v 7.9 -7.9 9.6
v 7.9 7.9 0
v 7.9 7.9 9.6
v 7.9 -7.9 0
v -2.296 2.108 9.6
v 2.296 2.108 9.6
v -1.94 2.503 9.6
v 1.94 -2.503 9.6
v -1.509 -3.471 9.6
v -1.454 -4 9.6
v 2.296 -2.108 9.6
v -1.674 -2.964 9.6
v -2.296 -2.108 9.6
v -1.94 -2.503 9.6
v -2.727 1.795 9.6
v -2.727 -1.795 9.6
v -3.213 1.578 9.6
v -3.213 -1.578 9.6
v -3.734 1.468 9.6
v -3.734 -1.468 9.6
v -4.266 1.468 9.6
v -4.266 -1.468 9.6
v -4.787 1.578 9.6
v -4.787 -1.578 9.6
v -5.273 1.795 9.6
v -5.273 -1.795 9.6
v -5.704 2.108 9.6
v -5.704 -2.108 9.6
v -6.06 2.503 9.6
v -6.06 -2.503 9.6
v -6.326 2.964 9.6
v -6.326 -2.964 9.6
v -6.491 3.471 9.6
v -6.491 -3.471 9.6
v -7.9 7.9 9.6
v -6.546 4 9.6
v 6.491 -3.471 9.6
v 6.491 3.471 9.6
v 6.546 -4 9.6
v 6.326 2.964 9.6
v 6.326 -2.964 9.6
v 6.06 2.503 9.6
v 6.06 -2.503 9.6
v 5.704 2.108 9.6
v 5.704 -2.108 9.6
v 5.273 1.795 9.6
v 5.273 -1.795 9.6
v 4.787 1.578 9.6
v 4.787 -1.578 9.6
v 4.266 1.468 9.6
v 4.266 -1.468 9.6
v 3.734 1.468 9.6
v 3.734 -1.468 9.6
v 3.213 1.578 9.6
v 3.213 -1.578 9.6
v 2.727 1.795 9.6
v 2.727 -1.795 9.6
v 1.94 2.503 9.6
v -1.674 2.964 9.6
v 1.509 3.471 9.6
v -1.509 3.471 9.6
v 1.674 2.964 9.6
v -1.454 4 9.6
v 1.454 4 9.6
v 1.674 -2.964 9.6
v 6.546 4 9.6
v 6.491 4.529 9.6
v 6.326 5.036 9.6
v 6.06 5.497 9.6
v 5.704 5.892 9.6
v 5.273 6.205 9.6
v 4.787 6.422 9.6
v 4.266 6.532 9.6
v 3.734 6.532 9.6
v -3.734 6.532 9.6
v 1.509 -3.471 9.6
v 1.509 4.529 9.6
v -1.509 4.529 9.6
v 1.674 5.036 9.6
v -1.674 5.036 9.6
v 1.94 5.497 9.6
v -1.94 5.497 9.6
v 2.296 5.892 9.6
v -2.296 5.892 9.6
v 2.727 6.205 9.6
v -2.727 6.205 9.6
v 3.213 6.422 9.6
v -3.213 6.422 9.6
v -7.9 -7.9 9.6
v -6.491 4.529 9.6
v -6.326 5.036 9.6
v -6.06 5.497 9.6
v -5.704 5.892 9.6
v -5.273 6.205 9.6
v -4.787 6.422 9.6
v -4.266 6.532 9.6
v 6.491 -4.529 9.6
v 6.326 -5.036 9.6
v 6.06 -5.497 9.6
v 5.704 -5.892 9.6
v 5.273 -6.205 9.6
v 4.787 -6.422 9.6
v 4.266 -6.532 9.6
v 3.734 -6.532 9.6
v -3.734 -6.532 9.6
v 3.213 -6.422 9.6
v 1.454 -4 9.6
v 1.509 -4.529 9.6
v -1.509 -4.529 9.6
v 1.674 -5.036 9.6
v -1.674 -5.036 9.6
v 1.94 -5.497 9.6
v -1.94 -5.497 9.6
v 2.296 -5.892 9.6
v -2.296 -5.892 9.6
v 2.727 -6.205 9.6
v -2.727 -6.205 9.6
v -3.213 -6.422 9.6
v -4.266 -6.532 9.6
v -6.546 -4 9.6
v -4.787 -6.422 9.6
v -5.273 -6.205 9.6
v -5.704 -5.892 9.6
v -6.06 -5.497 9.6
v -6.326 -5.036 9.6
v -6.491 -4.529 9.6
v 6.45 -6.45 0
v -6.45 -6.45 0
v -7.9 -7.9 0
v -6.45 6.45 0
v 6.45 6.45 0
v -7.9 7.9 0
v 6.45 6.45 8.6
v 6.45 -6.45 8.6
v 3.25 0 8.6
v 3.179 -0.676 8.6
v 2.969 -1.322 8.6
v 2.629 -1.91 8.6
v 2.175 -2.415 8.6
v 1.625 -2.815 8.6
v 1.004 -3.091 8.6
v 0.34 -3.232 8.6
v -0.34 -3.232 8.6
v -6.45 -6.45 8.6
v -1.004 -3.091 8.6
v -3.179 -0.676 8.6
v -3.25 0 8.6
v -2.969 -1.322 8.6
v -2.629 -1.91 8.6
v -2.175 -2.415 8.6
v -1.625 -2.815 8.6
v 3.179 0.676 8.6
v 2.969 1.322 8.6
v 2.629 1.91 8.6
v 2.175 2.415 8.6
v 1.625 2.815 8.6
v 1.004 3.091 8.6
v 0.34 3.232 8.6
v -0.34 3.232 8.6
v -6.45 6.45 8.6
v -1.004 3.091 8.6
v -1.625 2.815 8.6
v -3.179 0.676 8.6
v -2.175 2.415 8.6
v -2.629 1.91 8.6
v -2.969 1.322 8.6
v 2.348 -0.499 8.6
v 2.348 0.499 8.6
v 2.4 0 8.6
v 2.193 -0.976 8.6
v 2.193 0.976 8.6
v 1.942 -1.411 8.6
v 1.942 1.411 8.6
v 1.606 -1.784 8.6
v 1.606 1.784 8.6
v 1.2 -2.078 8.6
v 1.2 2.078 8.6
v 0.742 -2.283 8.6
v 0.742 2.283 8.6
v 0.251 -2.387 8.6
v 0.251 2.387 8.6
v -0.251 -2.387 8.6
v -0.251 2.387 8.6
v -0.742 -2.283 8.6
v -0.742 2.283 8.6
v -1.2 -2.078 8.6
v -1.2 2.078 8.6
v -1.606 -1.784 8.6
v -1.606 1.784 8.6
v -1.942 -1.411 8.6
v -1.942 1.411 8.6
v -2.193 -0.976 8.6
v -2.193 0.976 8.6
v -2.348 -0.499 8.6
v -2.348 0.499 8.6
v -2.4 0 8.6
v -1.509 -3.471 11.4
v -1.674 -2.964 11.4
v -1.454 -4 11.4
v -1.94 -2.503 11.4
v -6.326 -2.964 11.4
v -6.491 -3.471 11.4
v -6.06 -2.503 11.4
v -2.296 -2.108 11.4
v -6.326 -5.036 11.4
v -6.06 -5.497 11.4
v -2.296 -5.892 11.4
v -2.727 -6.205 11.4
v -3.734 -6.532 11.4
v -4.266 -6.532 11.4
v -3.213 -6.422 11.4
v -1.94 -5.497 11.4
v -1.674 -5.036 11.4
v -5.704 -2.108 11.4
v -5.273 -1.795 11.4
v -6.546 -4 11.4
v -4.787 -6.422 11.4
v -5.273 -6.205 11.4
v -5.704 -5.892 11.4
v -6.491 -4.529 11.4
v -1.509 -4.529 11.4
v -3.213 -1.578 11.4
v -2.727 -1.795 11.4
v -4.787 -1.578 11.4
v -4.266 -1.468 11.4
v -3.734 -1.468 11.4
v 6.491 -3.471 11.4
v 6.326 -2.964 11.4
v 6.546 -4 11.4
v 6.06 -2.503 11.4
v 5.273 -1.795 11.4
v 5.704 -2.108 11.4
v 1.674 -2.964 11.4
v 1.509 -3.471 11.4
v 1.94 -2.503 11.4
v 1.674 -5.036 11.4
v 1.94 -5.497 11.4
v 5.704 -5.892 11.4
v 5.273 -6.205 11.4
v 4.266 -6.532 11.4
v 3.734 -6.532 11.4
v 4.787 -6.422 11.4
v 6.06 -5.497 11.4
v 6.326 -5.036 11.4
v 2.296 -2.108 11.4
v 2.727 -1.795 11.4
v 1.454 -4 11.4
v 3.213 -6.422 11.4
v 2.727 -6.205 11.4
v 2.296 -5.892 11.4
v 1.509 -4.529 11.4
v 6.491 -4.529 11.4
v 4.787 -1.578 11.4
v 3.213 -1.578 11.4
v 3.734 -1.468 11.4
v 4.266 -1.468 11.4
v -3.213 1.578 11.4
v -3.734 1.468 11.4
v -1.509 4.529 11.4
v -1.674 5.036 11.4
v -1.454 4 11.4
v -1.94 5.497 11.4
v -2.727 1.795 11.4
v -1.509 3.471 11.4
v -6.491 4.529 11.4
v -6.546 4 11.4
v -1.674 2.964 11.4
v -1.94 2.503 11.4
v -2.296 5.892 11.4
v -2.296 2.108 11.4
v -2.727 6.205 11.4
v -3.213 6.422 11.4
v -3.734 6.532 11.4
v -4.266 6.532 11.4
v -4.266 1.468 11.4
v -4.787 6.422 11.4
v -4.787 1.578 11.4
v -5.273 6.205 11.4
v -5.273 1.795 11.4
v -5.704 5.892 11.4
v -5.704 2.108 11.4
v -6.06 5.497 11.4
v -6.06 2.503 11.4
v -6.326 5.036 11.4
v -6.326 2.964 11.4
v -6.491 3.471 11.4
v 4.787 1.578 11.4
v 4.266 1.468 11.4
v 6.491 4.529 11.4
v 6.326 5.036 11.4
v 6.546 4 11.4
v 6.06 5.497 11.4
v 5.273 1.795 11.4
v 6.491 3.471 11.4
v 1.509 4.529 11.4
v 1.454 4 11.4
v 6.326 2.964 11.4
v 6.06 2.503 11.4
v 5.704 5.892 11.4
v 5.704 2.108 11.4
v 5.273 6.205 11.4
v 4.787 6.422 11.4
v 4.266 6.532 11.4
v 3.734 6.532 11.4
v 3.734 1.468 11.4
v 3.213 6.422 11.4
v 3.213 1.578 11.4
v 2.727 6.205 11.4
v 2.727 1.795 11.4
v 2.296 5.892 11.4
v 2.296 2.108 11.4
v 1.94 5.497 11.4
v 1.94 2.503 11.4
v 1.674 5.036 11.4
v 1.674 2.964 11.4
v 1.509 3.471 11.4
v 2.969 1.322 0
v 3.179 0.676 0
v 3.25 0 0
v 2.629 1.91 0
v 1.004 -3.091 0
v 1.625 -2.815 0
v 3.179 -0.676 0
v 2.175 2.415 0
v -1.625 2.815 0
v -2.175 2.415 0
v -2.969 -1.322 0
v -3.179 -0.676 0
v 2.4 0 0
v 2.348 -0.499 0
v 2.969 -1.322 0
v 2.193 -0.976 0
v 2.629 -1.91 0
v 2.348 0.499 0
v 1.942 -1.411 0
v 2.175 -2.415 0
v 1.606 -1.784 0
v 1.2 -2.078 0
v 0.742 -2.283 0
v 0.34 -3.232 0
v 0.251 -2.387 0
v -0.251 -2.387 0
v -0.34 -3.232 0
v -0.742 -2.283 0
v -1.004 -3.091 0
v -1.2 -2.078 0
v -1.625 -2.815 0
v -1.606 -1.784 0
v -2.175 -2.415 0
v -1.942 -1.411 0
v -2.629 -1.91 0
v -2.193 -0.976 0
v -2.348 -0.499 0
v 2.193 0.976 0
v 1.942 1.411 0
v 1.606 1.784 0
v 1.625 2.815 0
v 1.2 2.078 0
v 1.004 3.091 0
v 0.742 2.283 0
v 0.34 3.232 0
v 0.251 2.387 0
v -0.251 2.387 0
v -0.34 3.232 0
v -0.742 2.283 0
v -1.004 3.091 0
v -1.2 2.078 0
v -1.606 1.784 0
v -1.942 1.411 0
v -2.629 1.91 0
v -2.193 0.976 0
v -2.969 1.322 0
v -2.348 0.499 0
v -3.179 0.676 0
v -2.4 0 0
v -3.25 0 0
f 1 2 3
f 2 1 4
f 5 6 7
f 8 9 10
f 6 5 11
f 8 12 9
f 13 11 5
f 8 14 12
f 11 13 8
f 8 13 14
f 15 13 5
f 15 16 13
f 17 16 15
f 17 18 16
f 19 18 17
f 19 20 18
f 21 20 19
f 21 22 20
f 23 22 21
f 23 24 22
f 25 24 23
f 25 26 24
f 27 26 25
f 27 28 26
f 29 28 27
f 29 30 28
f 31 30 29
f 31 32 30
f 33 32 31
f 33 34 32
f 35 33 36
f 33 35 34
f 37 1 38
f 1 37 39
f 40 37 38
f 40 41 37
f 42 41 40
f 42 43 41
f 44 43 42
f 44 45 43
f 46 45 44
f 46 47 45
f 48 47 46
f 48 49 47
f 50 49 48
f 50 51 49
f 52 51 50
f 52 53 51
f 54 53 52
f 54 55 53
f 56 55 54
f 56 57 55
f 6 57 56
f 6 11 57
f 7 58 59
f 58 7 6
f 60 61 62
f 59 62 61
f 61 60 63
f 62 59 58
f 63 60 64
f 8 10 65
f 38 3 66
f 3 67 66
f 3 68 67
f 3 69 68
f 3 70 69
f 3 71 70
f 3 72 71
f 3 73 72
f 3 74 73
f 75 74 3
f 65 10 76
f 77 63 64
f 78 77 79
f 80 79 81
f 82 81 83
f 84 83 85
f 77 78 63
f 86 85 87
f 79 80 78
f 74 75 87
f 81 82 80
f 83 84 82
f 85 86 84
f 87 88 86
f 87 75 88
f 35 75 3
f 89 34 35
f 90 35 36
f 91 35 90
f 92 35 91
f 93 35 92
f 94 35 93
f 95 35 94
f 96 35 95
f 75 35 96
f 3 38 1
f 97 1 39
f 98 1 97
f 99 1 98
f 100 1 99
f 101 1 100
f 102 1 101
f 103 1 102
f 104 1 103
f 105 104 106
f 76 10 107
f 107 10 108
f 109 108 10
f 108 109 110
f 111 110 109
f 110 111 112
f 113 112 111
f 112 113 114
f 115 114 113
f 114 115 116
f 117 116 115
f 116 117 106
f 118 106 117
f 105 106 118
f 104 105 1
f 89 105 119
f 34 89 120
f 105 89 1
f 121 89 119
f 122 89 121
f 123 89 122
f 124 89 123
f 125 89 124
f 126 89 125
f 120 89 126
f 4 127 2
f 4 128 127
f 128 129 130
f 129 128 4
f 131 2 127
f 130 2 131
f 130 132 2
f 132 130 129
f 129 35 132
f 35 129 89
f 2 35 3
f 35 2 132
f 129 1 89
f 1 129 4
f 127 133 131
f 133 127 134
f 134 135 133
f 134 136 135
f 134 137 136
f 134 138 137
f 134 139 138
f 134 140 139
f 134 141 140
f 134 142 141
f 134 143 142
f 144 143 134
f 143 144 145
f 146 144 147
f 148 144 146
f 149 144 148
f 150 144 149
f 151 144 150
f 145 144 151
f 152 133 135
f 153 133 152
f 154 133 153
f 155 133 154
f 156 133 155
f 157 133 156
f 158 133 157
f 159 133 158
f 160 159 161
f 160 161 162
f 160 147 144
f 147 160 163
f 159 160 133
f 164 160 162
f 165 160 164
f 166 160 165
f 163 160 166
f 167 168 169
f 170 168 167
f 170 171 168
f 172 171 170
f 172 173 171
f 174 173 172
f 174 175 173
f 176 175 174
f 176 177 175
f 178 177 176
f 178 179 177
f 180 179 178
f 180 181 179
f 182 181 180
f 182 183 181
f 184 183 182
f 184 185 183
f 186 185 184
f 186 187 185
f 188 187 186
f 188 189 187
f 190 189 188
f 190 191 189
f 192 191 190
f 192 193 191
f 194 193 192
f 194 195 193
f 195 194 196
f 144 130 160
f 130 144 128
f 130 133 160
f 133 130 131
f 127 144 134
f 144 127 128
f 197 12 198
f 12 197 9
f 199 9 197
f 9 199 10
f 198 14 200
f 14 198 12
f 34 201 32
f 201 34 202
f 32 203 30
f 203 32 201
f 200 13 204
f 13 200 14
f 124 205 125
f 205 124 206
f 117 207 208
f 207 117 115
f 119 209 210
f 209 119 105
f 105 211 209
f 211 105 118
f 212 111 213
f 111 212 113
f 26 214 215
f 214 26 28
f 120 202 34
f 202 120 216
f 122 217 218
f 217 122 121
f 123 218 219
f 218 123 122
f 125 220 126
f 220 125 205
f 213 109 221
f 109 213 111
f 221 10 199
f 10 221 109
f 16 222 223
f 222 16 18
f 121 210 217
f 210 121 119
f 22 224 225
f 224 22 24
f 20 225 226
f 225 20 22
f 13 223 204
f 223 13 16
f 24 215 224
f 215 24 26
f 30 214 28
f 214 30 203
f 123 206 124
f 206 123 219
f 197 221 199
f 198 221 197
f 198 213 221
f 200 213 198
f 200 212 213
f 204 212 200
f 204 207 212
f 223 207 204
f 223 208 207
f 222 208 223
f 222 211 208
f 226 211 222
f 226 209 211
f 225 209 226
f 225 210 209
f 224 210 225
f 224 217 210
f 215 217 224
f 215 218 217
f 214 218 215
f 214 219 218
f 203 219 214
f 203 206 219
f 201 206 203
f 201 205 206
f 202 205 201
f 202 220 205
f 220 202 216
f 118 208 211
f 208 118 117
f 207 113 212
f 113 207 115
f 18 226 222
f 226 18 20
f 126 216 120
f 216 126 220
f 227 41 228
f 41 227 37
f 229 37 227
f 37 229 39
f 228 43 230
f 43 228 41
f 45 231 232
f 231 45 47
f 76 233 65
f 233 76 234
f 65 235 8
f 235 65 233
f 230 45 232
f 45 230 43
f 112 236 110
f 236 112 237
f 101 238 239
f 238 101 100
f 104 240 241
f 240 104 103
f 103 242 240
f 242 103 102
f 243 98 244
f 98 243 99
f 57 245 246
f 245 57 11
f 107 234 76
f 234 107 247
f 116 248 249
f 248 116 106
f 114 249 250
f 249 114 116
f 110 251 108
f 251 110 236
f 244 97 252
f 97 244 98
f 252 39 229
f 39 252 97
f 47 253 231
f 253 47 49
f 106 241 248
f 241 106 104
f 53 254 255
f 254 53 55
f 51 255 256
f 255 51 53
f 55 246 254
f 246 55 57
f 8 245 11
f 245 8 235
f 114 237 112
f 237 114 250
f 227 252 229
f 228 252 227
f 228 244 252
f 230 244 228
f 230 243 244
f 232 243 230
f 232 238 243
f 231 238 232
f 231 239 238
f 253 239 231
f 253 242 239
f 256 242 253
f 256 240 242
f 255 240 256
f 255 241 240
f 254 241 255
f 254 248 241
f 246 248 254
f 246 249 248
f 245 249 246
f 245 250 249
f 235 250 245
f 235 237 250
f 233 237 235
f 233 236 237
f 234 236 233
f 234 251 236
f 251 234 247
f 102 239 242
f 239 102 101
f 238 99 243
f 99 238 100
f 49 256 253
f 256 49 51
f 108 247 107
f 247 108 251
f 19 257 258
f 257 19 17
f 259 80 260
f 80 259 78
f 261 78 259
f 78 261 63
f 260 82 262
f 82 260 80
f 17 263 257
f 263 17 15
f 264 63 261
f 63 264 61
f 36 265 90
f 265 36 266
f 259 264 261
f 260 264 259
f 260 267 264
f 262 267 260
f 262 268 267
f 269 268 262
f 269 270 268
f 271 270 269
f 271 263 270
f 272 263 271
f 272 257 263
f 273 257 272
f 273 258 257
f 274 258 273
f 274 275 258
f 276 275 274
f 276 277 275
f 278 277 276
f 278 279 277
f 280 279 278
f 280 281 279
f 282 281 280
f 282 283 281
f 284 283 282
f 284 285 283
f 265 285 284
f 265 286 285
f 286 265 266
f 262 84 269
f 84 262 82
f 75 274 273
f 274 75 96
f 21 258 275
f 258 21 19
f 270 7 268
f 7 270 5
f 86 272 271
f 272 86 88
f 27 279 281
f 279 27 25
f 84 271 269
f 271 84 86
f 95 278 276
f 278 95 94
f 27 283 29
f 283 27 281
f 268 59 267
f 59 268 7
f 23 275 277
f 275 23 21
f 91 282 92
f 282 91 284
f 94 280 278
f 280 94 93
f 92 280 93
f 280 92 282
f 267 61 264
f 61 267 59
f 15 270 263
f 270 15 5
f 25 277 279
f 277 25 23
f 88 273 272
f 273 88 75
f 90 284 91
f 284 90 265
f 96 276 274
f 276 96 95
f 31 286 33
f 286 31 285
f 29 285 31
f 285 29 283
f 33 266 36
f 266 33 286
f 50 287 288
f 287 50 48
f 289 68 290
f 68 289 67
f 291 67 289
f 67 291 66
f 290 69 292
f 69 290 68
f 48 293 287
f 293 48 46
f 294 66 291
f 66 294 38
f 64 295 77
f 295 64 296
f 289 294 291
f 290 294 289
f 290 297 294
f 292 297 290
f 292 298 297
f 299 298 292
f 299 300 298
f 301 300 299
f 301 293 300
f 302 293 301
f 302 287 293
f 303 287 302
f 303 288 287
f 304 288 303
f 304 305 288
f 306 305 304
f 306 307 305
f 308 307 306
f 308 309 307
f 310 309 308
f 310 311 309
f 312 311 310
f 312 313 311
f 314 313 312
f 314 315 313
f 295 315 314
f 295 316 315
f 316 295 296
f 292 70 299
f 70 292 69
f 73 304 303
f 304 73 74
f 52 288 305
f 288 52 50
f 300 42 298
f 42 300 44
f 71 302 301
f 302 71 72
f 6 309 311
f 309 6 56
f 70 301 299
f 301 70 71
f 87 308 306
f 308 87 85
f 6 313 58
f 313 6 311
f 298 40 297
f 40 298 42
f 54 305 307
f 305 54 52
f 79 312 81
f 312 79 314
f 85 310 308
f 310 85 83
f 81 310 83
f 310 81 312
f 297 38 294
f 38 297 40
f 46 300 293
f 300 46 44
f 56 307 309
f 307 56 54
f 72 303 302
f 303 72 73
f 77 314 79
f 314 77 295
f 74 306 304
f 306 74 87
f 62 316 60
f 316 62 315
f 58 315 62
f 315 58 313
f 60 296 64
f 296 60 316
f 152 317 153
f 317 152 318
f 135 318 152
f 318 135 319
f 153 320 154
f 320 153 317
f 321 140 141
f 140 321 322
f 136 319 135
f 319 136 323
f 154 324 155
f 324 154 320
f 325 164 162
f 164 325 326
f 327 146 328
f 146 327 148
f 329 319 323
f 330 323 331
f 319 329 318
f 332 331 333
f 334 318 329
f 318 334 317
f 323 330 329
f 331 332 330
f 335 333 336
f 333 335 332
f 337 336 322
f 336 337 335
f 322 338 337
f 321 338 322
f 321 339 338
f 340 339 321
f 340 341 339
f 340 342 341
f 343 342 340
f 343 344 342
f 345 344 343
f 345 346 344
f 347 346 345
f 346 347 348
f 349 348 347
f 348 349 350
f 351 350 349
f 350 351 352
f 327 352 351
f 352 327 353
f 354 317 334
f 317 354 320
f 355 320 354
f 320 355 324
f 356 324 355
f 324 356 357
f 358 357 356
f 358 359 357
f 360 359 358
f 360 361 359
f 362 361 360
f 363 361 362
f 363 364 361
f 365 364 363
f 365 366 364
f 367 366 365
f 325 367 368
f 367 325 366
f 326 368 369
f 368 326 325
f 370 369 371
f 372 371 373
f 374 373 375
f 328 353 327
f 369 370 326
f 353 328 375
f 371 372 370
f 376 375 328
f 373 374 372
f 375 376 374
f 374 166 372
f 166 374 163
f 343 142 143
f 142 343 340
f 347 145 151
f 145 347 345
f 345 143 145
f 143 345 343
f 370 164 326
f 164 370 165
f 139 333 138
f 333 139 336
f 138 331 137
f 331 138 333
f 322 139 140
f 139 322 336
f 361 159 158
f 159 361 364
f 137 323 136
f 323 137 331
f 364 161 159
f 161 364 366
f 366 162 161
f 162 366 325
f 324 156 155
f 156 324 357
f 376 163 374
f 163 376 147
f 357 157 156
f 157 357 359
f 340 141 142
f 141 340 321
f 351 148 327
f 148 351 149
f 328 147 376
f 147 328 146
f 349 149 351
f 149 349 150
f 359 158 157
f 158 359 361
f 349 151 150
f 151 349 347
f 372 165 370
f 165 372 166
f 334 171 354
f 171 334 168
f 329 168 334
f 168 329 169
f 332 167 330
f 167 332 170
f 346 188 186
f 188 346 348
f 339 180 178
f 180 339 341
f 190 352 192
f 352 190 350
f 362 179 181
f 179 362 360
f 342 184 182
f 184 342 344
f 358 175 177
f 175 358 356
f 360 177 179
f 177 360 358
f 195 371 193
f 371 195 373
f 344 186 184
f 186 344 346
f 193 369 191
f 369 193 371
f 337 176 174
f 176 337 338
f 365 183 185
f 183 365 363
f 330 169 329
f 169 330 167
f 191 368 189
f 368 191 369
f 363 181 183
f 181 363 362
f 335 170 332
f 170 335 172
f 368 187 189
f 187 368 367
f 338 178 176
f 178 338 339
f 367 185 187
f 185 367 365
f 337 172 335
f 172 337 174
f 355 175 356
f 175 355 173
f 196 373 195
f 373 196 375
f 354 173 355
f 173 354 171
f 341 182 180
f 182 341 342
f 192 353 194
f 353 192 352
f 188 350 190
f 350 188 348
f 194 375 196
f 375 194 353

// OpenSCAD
// FILE: CUSTOM_LEGO.scad
// AUTHOR: Anand T. Egan
// UPDATED: 2025-04-29
// FOR: 'CS 453 Robotics & 3D Printing' at the University of Alaska, Fairbanks

// LEGO® is a trademark of the LEGO Group of companies, which does not sponsor, authorize, or endorse this project.
// This script replicates LEGO®-style components such as bricks, tiles, and baseplates solely for educational purposes.
// The LEGO Group’s design of interlocking plastic bricks, including the appearance of LEGO® bricks, tiles, and baseplates,
// is protected by various intellectual property rights, including trademarks and design patents.
// This project is non-commercial and it's only intention is to explore 3D modeling concepts in OpenSCAD.

block(
    // ENTER THE BLOCK PARAMETERS HERE
    // UNITS OF MEASUREMENT: STUDS

    // The type of block?
    // Brick - "brick" - (block with studs on top)
    // Tile - "tile" - (block with no studs on top)
    // plate - "plate" (1/3 height) *OR* directly change height to 1/3
    // I was planning on more types of blocks, like slopes, or round, but I did not have enough time for that.
    type = "brick",

    // Length
    // Enter an integer, no decimals/fractions
    length = 2,

    // Width
    // Enter an integer, no decimals/fractions
    width = 2,

    // Height
    // Enter a number, decimals/fractions allowed
    // '1' - Normal height
    // '1/3' - Plate height
    height = 1,

    // Create the bottom tubes?
    // "true" or "false"
    tubes = true,

    // Recale the studs to be bigger?
    // Helpful when printing with certain materials like PLA
    // '1.00' - default
    // '1.05' - helped with PLA
    stud_rescale = 1.05
);

module block(

    // The default parameters for a block; a classic 2x2 LEGO brick
    type = "brick",
    length = 2,
    width = 2,
    height = 1,
    tubes = true,
    stud_rescale = 1
    
    ) {
    
    // === CONSTANTS ===
    // Block dimension and structural constants
    block_height = 9.6;          // Height of a standard brick (Official LEGO standard is 9.6mm)
    wall_thickness = 1.45;       // Thickness of exterior walls of the block
    roof_thickness = 1;          // Thickness of the top of the block

    // Stud constants
    stud_diameter = 4.85;        // Diameter of the top stud (Official LEGO standard is 4.8mm)
    stud_height = 1.8;           // Height of the top stud (Official LEGO standard is 1.8mm)
    stud_spacing = 8;            // Distance between the centers of studs (Official LEGO standard is 8mm)

    // Tube constants - (bottom support structure)
    tube_diameter = 6.5;         // Diameter of interior support tubes
    tube_wall_thickness = 0.85;  // Thickness of the walls for center posts

    // Pin parameters - (used when block is 1 stud wide/long)
    pin_diameter = 3;            // Diameter of pin (Official LEGO standard is 3mm)
    pin_radius = pin_diameter / 2;

    // Utility constants
    precision = 0.1;             // Precision for cylinder rounding
    fit_tolerance = 0.1;         // Offset to help avoid tight fit issues

    // === VARIABLES ===
    // Adjust stud size by user-defined scale
    stud_diameter_rescaled = stud_diameter * stud_rescale;
    stud_radius = stud_diameter_rescaled / 2;
    tube_radius = tube_diameter / 2;

    // Don't want to overwrite a literal
    // If "plate" type, override the height
    fixed_height = (type == "plate") ? 1/3 : height;
    
    // Normalize dimensions so length is always the longer side
    adjusted_length = max(width, length);
    adjusted_width = min(width, length);
    adjusted_height = max(1/3, fixed_height); // Make sure height is never less than 1/3

    scaled_block_height = adjusted_height * block_height;
                      
    // Calculate total physical size of the stud area (to center them)
    total_studs_length = (stud_diameter_rescaled * adjusted_length)
                       + ((adjusted_length - 1) 
                       * (stud_spacing - (stud_diameter_rescaled)));
                       
    total_studs_width = (stud_diameter_rescaled * adjusted_width) 
                      + ((adjusted_width - 1) 
                      * (stud_spacing - (stud_diameter_rescaled)));

    total_tubes_length = (tube_diameter * (adjusted_length - 1))
                       + ((adjusted_length - 2) 
                       * (stud_spacing - tube_diameter));

    total_tubes_width = (tube_diameter * (adjusted_width - 1)) 
                      + ((adjusted_width - 2) 
                      * (stud_spacing - tube_diameter));

    // Pins used when block is 1 stud wide/long
    total_pins_length = (pin_diameter * (adjusted_length - 1)) 
                      + max(0, ((adjusted_length - 2) 
                      * (stud_spacing - pin_diameter)));

    total_pins_width = (pin_diameter * (adjusted_width - 1)) 
                     + max(0, ((adjusted_width - 2) 
                     * (stud_spacing - pin_diameter)));

    // Total physical block dimensions
    overall_length = (adjusted_length * stud_spacing) - (2 * fit_tolerance);
    overall_width = (adjusted_width * stud_spacing) - (2 * fit_tolerance);
    
    // === MAIN BLOCK STRUCTURE ===
    translate([-overall_length/2, -overall_width/2, 0])
        union() {
            difference() {
                union() {                    
                    // Outer block shell
                    difference() {
                        // Solid cuboid for block body
                        cube([
                            overall_length, 
                            overall_width, 
                            scaled_block_height
                        ]);
                        // Hollow center.
                        translate([wall_thickness, wall_thickness, -roof_thickness]) 
                            cube([
                                overall_length - wall_thickness * 2,
                                overall_width - wall_thickness * 2,
                                scaled_block_height
                            ]);
                    }

                    // === STUDS ===    
                    // The studs on top of the block IF IT IS NOT A "tile" block
                    if ( type != "tile") {
                        // Position and loop to place studs on top
                        translate([stud_radius, stud_radius, 0]) 
                            translate([(overall_length - total_studs_length) / 2, (overall_width - total_studs_width) / 2, 0]) {
                                for (ycount=[0:adjusted_width-1]) {
                                    for (xcount = [0 : adjusted_length - 1]) {
                                        translate([xcount * stud_spacing, ycount * stud_spacing, scaled_block_height]) 
                                            stud();
                                    }
                                }
                            }
                    }

                    // === TUBES (if block is 2x2 or larger) ===
                    if (adjusted_width > 1 && adjusted_length > 1
                                           && roof_thickness < block_height * fixed_height) {
                        translate([tube_radius, tube_radius, 0]) {
                            translate([(overall_length - total_tubes_length)/2, (overall_width - total_tubes_width)/2, 0]) {
                                union() {
                                    // tubes
                                    if(tubes) {
                                        for (ycount=[1 : adjusted_width - 1]) {
                                            for (xcount = [1 : adjusted_length - 1]) {
                                                translate([(xcount - 1) * stud_spacing, (ycount - 1) * stud_spacing, 0]) 
                                                    tube();
                                            }
                                        }
                                    }
                                }
                            }
                        }
                    }

                    // === PINS (used when brick is a single row/column) ===
                    if ((adjusted_width == 1 || adjusted_length == 1) 
                                        && adjusted_width != adjusted_length 
                                        && roof_thickness < block_height * fixed_height) {
                        // Pins
                        if (adjusted_width == 1) {
                            // Single row - add pin support length side
                            translate([pin_radius + (overall_length - total_pins_length) / 2, overall_width/2, 0]) {
                                for (xcount = [1 : adjusted_length - 1]) {
                                    translate([(xcount - 1) * stud_spacing, 0, 0]) 
                                        cylinder(
                                            r = pin_radius,
                                            h = scaled_block_height,
                                            $fs = precision
                                        );
                                }
                            }
                        }
                        else {
                            // Single column - add pin support width side
                            translate([overall_length / 2, pin_radius + (overall_width - total_pins_width) / 2, 0]) {
                                for (ycount = [1 : adjusted_width - 1]) {
                                    translate([0, (ycount - 1) * stud_spacing, 0]) 
                                        cylinder(
                                            r = pin_radius,
                                            h = scaled_block_height,
                                            $fs = precision
                                        );
                                }
                            }
                        }
                    }
                }
                
            }
        
    }

    // === STUD MODULE ===
    // Generates a stud, used to connect pieces together
    module stud() {
        stud_body_height = stud_height;
        cylinder(
            r = stud_radius, 
            h = stud_body_height, 
            $fs = precision
        );  

    }

    // === TUBE MODULE ===
    // Generates a hollow tube, used for strength
    module tube() {
        difference() {
            // Outer cylinder
            cylinder(
                r = tube_radius, 
                h = scaled_block_height,
                $fs = precision
            );
            // Inner hollow
            translate([0,0,-0.5]) 
                cylinder(
                    r = tube_radius - tube_wall_thickness, 
                    h = scaled_block_height + 1,
                    $fs = precision
                );
        }
    }
}
